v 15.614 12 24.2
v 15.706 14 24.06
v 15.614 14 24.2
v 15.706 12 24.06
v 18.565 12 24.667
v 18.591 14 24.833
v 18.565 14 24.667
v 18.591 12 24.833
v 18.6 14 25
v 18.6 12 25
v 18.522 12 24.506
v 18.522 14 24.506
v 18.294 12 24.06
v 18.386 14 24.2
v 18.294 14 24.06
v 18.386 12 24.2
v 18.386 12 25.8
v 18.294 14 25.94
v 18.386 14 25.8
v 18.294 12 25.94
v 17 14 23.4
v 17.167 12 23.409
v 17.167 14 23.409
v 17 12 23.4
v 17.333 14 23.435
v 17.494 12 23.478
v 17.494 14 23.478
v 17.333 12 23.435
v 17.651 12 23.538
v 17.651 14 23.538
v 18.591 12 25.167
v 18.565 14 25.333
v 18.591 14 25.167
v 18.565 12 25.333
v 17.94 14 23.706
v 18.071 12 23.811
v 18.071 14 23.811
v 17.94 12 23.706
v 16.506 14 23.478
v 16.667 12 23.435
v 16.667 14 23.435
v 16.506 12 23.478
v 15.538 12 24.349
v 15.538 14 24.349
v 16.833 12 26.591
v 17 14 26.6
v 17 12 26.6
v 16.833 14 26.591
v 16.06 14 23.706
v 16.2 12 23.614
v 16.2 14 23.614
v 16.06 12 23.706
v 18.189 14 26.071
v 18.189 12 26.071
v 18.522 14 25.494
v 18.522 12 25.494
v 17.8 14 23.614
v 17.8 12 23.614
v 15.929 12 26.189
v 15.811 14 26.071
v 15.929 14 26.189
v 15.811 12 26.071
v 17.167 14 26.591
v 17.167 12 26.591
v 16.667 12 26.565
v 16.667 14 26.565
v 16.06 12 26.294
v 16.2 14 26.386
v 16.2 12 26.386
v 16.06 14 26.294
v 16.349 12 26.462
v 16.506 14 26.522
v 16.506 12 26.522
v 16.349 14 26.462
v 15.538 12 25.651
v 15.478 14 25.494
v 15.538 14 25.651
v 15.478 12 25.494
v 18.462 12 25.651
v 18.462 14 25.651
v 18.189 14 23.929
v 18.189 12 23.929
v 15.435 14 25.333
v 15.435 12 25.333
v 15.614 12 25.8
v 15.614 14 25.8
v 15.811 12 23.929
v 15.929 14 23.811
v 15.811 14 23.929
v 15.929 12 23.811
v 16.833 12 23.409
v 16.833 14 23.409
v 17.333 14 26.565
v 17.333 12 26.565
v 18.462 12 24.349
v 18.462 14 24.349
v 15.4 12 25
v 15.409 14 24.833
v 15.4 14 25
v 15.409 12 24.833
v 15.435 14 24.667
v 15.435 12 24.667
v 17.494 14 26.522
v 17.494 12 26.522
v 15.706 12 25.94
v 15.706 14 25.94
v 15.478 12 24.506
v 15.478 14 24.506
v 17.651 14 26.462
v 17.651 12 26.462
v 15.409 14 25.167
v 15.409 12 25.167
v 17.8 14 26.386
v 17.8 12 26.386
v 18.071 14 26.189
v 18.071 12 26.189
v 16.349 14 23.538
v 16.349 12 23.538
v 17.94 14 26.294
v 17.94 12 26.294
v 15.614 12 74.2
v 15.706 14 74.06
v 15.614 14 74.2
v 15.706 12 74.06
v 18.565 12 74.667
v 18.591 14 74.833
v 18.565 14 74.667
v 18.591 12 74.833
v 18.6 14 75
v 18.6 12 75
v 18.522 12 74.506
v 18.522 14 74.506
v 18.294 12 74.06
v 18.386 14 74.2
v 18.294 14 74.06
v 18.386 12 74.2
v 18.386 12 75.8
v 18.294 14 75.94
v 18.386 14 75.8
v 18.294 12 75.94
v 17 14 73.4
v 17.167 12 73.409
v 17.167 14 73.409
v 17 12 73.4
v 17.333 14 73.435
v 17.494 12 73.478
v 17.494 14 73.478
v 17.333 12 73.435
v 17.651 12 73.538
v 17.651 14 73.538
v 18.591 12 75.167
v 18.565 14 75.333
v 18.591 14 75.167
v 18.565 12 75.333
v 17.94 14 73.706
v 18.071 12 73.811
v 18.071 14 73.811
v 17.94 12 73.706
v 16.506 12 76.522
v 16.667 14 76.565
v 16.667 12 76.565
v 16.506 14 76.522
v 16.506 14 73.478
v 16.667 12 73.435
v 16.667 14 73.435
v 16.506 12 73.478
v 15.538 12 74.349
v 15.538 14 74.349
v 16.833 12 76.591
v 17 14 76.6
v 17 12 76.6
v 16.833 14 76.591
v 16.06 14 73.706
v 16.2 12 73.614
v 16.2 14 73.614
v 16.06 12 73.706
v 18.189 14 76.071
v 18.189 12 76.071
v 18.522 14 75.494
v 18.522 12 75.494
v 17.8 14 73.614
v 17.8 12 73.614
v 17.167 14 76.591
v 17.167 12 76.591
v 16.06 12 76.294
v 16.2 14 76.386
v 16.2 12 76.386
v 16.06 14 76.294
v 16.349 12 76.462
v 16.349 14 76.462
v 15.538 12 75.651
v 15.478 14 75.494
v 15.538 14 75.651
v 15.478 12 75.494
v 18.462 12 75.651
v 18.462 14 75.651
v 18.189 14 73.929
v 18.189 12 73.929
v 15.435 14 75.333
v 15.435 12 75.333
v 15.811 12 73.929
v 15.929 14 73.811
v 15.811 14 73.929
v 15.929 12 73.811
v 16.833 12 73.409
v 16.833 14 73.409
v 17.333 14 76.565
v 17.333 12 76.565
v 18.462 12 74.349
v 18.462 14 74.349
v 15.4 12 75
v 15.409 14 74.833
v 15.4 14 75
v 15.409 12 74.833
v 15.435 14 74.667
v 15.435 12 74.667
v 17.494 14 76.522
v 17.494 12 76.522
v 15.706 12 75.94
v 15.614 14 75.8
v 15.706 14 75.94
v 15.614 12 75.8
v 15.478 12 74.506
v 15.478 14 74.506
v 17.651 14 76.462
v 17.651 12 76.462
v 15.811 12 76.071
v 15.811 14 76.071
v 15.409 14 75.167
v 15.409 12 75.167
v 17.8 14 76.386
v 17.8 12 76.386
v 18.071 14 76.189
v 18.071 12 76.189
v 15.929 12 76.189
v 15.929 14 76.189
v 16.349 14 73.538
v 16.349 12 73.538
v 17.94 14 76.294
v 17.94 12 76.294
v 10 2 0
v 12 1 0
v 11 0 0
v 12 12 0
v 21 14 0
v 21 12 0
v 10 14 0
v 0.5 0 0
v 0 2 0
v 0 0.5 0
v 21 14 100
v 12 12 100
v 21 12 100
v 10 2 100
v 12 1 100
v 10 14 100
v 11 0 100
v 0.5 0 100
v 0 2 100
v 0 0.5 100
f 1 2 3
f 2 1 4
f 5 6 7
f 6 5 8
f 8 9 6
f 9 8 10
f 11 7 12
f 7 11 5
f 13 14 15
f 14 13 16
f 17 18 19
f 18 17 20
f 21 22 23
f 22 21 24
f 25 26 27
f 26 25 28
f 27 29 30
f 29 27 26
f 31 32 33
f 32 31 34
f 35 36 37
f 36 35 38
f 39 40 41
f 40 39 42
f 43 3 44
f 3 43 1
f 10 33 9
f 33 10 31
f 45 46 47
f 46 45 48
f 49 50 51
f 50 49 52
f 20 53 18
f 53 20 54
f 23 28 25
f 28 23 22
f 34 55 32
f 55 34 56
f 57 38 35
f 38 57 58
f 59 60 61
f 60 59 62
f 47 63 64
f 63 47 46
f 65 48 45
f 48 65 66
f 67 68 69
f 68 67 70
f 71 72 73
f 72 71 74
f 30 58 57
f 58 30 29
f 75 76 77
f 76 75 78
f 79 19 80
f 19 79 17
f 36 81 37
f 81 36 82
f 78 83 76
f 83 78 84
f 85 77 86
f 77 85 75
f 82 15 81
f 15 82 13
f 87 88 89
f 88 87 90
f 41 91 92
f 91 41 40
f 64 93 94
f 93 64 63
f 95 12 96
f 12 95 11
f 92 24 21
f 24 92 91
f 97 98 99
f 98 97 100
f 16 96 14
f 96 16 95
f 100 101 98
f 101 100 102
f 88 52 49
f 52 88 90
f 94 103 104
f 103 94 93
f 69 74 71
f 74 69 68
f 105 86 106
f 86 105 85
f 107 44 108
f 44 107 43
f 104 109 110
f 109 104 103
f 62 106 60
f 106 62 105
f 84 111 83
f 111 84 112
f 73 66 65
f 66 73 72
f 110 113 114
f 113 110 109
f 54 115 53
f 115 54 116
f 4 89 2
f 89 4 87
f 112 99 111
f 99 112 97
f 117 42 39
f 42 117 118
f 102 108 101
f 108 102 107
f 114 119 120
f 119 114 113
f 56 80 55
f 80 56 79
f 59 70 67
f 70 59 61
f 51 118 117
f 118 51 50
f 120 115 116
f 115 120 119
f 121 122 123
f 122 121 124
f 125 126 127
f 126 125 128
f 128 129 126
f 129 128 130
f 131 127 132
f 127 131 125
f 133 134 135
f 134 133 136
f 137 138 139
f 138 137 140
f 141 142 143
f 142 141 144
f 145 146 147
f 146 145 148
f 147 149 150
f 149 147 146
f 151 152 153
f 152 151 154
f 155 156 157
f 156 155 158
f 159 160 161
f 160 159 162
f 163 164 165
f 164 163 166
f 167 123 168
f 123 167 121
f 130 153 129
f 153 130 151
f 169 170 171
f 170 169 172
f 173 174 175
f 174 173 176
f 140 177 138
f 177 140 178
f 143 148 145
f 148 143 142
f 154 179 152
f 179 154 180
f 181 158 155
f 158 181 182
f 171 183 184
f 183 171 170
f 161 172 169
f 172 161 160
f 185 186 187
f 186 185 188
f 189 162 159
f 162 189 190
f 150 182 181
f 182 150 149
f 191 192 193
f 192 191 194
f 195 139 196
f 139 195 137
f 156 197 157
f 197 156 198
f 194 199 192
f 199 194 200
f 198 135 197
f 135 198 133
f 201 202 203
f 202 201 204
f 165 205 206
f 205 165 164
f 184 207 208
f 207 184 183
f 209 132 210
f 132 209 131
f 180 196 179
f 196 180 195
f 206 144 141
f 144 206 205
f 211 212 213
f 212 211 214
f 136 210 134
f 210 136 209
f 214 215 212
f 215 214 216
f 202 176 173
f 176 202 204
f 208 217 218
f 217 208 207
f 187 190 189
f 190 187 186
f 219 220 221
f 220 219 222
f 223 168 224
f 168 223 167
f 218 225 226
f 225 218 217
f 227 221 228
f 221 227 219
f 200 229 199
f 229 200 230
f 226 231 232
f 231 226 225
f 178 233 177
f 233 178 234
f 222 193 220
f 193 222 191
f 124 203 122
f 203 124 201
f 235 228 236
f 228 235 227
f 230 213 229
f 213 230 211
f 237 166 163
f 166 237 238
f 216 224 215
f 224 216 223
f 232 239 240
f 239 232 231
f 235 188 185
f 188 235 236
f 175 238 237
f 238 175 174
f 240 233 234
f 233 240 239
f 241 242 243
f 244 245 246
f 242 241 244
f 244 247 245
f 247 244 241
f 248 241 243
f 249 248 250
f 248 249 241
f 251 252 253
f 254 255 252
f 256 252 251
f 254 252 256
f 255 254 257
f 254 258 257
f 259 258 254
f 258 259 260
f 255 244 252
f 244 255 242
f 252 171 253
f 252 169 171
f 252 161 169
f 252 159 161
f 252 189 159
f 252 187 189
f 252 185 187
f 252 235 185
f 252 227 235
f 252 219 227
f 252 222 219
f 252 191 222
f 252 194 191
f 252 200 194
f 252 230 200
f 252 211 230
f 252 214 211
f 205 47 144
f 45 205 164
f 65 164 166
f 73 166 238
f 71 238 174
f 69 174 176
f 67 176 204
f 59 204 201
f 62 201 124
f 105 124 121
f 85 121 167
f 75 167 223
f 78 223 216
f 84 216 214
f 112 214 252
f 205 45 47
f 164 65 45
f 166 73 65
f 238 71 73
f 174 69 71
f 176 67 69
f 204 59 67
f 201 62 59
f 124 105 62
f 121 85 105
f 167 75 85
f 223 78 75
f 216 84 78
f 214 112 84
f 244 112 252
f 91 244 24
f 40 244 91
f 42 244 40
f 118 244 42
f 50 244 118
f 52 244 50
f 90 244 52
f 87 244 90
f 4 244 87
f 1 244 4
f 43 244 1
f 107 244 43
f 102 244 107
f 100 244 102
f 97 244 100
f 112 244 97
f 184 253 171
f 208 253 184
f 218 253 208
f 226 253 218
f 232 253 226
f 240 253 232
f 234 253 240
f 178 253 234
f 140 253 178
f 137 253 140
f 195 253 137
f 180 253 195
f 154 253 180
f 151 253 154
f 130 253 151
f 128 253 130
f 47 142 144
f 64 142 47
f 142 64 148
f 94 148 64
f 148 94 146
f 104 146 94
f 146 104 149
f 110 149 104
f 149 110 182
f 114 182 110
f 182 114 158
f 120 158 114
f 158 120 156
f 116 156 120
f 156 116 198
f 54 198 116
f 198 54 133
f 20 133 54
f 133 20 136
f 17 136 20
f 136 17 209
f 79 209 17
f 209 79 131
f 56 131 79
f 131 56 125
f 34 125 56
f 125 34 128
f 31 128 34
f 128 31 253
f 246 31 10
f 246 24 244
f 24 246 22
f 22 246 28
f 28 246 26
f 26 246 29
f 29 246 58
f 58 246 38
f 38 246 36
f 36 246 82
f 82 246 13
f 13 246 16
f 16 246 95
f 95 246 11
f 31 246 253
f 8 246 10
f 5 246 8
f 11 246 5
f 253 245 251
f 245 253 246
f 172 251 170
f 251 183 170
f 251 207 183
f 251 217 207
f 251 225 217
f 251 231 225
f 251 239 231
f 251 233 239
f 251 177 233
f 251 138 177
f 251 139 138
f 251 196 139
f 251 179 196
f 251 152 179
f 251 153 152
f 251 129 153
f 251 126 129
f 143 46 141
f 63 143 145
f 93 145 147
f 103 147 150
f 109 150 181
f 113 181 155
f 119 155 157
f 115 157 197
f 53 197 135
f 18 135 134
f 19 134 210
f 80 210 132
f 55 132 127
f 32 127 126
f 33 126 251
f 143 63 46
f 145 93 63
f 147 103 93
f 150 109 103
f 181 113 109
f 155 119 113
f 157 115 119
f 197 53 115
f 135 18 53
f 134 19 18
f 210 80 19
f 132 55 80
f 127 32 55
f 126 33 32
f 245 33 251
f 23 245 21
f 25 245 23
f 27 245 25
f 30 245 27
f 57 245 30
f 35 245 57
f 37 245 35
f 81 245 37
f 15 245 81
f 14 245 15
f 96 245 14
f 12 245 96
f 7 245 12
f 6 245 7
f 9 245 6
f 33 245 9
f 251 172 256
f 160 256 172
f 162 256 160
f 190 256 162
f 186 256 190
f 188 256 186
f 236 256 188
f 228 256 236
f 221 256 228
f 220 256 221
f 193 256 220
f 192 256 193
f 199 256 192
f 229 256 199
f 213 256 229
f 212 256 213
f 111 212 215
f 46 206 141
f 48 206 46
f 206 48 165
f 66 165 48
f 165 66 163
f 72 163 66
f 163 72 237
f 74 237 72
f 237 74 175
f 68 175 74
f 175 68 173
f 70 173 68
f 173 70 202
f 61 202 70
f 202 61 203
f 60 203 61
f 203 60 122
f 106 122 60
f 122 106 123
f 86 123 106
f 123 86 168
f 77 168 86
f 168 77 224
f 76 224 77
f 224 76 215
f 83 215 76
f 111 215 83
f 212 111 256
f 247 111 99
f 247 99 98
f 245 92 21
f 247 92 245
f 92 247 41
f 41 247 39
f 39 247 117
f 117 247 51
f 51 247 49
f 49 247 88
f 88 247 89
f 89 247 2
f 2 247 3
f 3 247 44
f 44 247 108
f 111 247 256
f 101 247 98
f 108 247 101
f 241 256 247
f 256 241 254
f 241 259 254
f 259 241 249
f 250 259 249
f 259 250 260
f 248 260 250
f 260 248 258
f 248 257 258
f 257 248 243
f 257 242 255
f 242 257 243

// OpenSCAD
// ============================================
// 基本寸法パラメータ (単位: mm)
// ============================================
left_w       = 10;   // 左側ブロックの幅
left_h       = 2;    // 左側ブロックの厚み (高さ)

pillar_w     = 2;    // 中央ピラーの幅
pillar_top_h = 12;   // 左側上面からピラー頂面までの高さ
total_h      = left_h + pillar_top_h; // 全高 (2 + 11 = 13mm)

right_w      = 9;    // 右側ブロックの幅
right_h      = 2;    // 右側ブロックの厚み (適宜調整)

extrude_len  = 100;  // 押し出し長さ: 10cm = 100mm

// ============================================
// 面取り・穴パラメータ (単位: mm)
// ============================================
chamfer_left  = 0.5; // 左下角の面取り幅 (C面)
chamfer_right = 1.0; // 右下(ピラー底面右)角の面取り幅 (C面)

screw_d       = 3.2; // 穴の直径 (通し穴マージン込み)
screw_pos_x   = 5;   // 右側ブロック左端(ピラー右面)からの距離 (幅方向)

// 2箇所の穴の位置 (押し出しZ軸方向: 端からのオフセット)
screw_pos_z1  = 25;  // 1つ目の穴のZ座標
screw_pos_z2  = 75;  // 2つ目の穴のZ座標

$fn = 60; // 円筒の滑らかさ

// ============================================
// 3Dモデル生成
// ============================================
difference() {
    // 押し出し本体 (底面側の角を面取りしたポリゴン)
    linear_extrude(height = extrude_len) {
        polygon(points = [
            // 左下角の面取り
            [chamfer_left, 0],
            
            // ピラー右下角の面取り
            [left_w + pillar_w - chamfer_right, 0],
            [left_w + pillar_w, chamfer_right],
            
            // 右側ブロックおよび上部形状
            [left_w + pillar_w, total_h - right_h],
            [left_w + pillar_w + right_w, total_h - right_h],
            [left_w + pillar_w + right_w, total_h],
            [left_w, total_h],
            [left_w, left_h],
            [0, left_h],
            
            // 左下角の面取りの戻り
            [0, chamfer_left]
        ]);
    }

    // 木ネジ用貫通穴 (2箇所)
    for (z = [screw_pos_z1, screw_pos_z2]) {
        translate([
            left_w + pillar_w + screw_pos_x,
            total_h - right_h - 1,
            z
        ])
        rotate([-90, 0, 0])
        cylinder(d = screw_d, h = right_h + 2);
    }
}
